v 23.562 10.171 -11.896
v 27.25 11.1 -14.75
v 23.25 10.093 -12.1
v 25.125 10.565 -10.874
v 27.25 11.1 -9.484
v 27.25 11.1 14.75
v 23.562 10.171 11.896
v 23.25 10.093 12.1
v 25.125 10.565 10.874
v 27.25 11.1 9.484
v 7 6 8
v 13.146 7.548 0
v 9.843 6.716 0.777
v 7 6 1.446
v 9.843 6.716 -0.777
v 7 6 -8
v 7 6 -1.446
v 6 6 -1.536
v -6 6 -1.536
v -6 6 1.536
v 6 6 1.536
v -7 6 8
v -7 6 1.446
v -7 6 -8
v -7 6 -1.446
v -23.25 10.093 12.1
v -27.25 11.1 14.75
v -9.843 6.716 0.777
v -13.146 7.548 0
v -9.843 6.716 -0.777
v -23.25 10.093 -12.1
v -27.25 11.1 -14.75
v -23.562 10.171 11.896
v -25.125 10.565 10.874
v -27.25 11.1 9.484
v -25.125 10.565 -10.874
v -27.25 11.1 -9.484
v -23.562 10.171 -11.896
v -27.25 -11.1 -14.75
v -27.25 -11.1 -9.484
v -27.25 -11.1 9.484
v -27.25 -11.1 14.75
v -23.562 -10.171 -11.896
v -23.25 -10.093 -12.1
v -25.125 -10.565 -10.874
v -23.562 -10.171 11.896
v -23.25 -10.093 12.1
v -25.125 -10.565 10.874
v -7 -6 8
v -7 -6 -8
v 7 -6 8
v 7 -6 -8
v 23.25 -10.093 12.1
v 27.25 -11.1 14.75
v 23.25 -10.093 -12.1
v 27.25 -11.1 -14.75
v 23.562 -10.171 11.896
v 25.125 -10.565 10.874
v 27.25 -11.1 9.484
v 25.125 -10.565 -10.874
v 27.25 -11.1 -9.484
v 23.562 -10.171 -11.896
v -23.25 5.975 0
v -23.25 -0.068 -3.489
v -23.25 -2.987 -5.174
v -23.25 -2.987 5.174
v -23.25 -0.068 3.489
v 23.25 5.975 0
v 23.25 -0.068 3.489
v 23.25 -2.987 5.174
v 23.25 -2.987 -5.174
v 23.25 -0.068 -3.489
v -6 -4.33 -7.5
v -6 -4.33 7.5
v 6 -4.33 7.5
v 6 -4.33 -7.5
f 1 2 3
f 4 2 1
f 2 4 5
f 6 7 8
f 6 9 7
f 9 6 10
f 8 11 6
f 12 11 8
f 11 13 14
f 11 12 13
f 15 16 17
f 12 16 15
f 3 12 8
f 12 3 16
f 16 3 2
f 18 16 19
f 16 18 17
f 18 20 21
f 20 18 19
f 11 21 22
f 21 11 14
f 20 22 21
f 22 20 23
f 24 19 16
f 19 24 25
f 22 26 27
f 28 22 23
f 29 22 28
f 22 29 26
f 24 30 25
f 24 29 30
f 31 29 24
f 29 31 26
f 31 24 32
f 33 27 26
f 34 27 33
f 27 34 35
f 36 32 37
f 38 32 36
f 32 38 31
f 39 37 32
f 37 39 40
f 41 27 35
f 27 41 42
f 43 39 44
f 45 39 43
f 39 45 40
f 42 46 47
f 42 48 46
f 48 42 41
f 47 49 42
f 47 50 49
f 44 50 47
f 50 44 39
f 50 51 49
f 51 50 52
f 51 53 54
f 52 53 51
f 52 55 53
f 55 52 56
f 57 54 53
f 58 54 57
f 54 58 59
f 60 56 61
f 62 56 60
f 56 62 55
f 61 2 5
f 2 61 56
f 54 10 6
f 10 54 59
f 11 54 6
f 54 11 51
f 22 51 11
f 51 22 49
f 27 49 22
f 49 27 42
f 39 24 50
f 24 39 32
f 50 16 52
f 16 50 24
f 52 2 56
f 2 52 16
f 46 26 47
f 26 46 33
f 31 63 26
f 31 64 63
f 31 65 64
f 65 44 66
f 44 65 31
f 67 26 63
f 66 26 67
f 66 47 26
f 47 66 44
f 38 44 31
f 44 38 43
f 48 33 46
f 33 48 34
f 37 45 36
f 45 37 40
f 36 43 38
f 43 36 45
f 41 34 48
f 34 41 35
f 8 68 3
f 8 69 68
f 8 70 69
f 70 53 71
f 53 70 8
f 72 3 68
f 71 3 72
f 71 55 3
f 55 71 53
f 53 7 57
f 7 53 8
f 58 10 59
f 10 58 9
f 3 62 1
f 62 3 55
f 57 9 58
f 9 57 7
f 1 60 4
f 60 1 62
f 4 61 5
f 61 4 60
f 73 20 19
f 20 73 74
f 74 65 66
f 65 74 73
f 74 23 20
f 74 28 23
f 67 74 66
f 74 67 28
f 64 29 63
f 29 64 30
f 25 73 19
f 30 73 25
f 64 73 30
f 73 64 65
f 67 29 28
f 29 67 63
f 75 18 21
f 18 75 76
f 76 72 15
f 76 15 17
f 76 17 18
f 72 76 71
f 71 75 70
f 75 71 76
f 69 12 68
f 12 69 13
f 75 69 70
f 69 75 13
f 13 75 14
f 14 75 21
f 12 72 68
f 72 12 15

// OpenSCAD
// Symmetric double-ended wedge/clevis-like spacer with opposing flared arms
// and two opposing tapered triangular tunnels.
// Bounding box target: 54.5 x 22.2 x 29.5 mm (L x W x H)

$fn = 96;

// --- Target overall size ---
L = 54.5;
W = 22.2;
H = 29.5;

// --- Shape controls ---
center_L = 14.0;                 // short central block length
arm_L_each = (L - center_L)/2;   // computed to hit overall L

waist_W = 12.0;                  // narrow waist width (Y)
waist_H = 16.0;                  // narrow waist height (Z)

end_W = W;                       // end width (Y)
end_H = H;                       // end height (Z)

overlap = 0.8;                   // overlap to guarantee connectivity

// End chamfer depth along X (creates angled end faces)
end_chamfer = 3.0;

// Triangular tunnel parameters (tapering toward center)
tri_end_side = 14.0;             // triangle side at the end face
tri_center_side = 8.0;           // triangle side near the center (smaller)
tri_clear = 0.5;                 // clearance added to triangle size
tri_depth_each_end = arm_L_each; // tunnel depth from each end toward center

// Extra length for cutters to ensure clean subtraction
cut_extra = 1.0;

// ----------------- Helpers -----------------
function tri_h(side) = side * sqrt(3) / 2;

// Equilateral triangle centered at origin in YZ plane (2D polygon in YZ)
module tri2d(side) {
    s = side;
    h = tri_h(s);
    polygon(points=[
        [ 0,        2*h/3],
        [-s/2,     -h/3 ],
        [ s/2,     -h/3 ]
    ]);
}

// 2D trapezoid in XZ (for side-view hourglass), centered at origin.
// width at center = w0, width at ends = w1, total length = len
module trapezoid_xz(len, w0, w1) {
    polygon(points=[
        [-len/2, -w1/2],
        [ len/2, -w1/2],
        [ len/2,  w1/2],
        [-len/2,  w1/2]
    ]);
}

// Outer envelope: central + two arms, with true flare (hourglass/X in side views)
// Achieved by intersecting two orthogonal "hourglass prisms" (one controls Y vs X, one controls Z vs X)
module outer_envelope() {
    // Prism controlling Y flare along X (extruded in Z)
    module prismY() {
        linear_extrude(height=H + 2*cut_extra, center=true, convexity=10)
            polygon(points=[
                [-L/2, -end_W/2],
                [ L/2, -end_W/2],
                [ L/2,  end_W/2],
                [-L/2,  end_W/2]
            ]);
        // Replace above with true trapezoid in XY:
        // (OpenSCAD doesn't allow easy "variable width" rectangle without polygon)
    }

    // True trapezoid in XY (Y width varies with X)
    module prismY_true() {
        linear_extrude(height=H + 2*cut_extra, center=true, convexity=10)
            polygon(points=[
                [-L/2, -end_W/2],
                [-center_L/2, -waist_W/2],
                [ center_L/2, -waist_W/2],
                [ L/2, -end_W/2],
                [ L/2,  end_W/2],
                [ center_L/2,  waist_W/2],
                [-center_L/2,  waist_W/2],
                [-L/2,  end_W/2]
            ]);
    }

    // True trapezoid in XZ (Z height varies with X), extruded in Y
    module prismZ_true() {
        rotate([90,0,0])  // extrude along Y
            linear_extrude(height=W + 2*cut_extra, center=true, convexity=10)
                polygon(points=[
                    [-L/2, -end_H/2],
                    [-center_L/2, -waist_H/2],
                    [ center_L/2, -waist_H/2],
                    [ L/2, -end_H/2],
                    [ L/2,  end_H/2],
                    [ center_L/2,  waist_H/2],
                    [-center_L/2,  waist_H/2],
                    [-L/2,  end_H/2]
                ]);
    }

    // Intersect to get an "X/hourglass" silhouette in both side views
    intersection() {
        prismY_true();
        prismZ_true();
    }
}

// End chamfer cutters: subtract frustums to create angled end faces
module end_chamfer_cutter(side_sign=1) {
    x_end = side_sign * (L/2);
    x_c = x_end - side_sign*(end_chamfer/2);

    // Frustum along X: larger at outside, smaller inward
    // Use linear_extrude along X by rotating a 2D square in YZ.
    translate([x_c, 0, 0])
        rotate([0, 90*side_sign, 0])
            linear_extrude(
                height=end_chamfer + 2*cut_extra,
                center=true,
                convexity=10,
                scale=[(end_W - 2*end_chamfer)/end_W, (end_H - 2*end_chamfer)/end_H]
            )
                square([end_W + 2*cut_extra, end_H + 2*cut_extra], center=true);
}

// Tapered triangular tunnel from each end toward center (triangular through-opening)
module tri_tunnel(side_sign=1) {
    // Place the cutter so its outer face aligns with the end face at x = +/- L/2
    // With center=true extrusion, the extrude spans [x_mid - h/2, x_mid + h/2] in local X after rotation.
    // Choose x_mid so the outermost reaches the end face.
    h_ex = tri_depth_each_end + 2*cut_extra;
    x_mid = side_sign * (L/2 - h_ex/2 + cut_extra);

    translate([x_mid, 0, 0])
        rotate([0, 90*side_sign, 0])
            linear_extrude(
                height=h_ex,
                center=true,
                convexity=10,
                scale=( (tri_center_side + 2*tri_clear) / (tri_end_side + 2*tri_clear) )
            )
                tri2d(tri_end_side + 2*tri_clear);
}

// ----------------- Final model -----------------
difference() {
    // Base solid (single connected body)
    outer_envelope();

    // End chamfers
    end_chamfer_cutter(-1);
    end_chamfer_cutter(+1);

    // Two opposing tapered triangular tunnels (one from each end)
    tri_tunnel(-1);
    tri_tunnel(+1);
}
